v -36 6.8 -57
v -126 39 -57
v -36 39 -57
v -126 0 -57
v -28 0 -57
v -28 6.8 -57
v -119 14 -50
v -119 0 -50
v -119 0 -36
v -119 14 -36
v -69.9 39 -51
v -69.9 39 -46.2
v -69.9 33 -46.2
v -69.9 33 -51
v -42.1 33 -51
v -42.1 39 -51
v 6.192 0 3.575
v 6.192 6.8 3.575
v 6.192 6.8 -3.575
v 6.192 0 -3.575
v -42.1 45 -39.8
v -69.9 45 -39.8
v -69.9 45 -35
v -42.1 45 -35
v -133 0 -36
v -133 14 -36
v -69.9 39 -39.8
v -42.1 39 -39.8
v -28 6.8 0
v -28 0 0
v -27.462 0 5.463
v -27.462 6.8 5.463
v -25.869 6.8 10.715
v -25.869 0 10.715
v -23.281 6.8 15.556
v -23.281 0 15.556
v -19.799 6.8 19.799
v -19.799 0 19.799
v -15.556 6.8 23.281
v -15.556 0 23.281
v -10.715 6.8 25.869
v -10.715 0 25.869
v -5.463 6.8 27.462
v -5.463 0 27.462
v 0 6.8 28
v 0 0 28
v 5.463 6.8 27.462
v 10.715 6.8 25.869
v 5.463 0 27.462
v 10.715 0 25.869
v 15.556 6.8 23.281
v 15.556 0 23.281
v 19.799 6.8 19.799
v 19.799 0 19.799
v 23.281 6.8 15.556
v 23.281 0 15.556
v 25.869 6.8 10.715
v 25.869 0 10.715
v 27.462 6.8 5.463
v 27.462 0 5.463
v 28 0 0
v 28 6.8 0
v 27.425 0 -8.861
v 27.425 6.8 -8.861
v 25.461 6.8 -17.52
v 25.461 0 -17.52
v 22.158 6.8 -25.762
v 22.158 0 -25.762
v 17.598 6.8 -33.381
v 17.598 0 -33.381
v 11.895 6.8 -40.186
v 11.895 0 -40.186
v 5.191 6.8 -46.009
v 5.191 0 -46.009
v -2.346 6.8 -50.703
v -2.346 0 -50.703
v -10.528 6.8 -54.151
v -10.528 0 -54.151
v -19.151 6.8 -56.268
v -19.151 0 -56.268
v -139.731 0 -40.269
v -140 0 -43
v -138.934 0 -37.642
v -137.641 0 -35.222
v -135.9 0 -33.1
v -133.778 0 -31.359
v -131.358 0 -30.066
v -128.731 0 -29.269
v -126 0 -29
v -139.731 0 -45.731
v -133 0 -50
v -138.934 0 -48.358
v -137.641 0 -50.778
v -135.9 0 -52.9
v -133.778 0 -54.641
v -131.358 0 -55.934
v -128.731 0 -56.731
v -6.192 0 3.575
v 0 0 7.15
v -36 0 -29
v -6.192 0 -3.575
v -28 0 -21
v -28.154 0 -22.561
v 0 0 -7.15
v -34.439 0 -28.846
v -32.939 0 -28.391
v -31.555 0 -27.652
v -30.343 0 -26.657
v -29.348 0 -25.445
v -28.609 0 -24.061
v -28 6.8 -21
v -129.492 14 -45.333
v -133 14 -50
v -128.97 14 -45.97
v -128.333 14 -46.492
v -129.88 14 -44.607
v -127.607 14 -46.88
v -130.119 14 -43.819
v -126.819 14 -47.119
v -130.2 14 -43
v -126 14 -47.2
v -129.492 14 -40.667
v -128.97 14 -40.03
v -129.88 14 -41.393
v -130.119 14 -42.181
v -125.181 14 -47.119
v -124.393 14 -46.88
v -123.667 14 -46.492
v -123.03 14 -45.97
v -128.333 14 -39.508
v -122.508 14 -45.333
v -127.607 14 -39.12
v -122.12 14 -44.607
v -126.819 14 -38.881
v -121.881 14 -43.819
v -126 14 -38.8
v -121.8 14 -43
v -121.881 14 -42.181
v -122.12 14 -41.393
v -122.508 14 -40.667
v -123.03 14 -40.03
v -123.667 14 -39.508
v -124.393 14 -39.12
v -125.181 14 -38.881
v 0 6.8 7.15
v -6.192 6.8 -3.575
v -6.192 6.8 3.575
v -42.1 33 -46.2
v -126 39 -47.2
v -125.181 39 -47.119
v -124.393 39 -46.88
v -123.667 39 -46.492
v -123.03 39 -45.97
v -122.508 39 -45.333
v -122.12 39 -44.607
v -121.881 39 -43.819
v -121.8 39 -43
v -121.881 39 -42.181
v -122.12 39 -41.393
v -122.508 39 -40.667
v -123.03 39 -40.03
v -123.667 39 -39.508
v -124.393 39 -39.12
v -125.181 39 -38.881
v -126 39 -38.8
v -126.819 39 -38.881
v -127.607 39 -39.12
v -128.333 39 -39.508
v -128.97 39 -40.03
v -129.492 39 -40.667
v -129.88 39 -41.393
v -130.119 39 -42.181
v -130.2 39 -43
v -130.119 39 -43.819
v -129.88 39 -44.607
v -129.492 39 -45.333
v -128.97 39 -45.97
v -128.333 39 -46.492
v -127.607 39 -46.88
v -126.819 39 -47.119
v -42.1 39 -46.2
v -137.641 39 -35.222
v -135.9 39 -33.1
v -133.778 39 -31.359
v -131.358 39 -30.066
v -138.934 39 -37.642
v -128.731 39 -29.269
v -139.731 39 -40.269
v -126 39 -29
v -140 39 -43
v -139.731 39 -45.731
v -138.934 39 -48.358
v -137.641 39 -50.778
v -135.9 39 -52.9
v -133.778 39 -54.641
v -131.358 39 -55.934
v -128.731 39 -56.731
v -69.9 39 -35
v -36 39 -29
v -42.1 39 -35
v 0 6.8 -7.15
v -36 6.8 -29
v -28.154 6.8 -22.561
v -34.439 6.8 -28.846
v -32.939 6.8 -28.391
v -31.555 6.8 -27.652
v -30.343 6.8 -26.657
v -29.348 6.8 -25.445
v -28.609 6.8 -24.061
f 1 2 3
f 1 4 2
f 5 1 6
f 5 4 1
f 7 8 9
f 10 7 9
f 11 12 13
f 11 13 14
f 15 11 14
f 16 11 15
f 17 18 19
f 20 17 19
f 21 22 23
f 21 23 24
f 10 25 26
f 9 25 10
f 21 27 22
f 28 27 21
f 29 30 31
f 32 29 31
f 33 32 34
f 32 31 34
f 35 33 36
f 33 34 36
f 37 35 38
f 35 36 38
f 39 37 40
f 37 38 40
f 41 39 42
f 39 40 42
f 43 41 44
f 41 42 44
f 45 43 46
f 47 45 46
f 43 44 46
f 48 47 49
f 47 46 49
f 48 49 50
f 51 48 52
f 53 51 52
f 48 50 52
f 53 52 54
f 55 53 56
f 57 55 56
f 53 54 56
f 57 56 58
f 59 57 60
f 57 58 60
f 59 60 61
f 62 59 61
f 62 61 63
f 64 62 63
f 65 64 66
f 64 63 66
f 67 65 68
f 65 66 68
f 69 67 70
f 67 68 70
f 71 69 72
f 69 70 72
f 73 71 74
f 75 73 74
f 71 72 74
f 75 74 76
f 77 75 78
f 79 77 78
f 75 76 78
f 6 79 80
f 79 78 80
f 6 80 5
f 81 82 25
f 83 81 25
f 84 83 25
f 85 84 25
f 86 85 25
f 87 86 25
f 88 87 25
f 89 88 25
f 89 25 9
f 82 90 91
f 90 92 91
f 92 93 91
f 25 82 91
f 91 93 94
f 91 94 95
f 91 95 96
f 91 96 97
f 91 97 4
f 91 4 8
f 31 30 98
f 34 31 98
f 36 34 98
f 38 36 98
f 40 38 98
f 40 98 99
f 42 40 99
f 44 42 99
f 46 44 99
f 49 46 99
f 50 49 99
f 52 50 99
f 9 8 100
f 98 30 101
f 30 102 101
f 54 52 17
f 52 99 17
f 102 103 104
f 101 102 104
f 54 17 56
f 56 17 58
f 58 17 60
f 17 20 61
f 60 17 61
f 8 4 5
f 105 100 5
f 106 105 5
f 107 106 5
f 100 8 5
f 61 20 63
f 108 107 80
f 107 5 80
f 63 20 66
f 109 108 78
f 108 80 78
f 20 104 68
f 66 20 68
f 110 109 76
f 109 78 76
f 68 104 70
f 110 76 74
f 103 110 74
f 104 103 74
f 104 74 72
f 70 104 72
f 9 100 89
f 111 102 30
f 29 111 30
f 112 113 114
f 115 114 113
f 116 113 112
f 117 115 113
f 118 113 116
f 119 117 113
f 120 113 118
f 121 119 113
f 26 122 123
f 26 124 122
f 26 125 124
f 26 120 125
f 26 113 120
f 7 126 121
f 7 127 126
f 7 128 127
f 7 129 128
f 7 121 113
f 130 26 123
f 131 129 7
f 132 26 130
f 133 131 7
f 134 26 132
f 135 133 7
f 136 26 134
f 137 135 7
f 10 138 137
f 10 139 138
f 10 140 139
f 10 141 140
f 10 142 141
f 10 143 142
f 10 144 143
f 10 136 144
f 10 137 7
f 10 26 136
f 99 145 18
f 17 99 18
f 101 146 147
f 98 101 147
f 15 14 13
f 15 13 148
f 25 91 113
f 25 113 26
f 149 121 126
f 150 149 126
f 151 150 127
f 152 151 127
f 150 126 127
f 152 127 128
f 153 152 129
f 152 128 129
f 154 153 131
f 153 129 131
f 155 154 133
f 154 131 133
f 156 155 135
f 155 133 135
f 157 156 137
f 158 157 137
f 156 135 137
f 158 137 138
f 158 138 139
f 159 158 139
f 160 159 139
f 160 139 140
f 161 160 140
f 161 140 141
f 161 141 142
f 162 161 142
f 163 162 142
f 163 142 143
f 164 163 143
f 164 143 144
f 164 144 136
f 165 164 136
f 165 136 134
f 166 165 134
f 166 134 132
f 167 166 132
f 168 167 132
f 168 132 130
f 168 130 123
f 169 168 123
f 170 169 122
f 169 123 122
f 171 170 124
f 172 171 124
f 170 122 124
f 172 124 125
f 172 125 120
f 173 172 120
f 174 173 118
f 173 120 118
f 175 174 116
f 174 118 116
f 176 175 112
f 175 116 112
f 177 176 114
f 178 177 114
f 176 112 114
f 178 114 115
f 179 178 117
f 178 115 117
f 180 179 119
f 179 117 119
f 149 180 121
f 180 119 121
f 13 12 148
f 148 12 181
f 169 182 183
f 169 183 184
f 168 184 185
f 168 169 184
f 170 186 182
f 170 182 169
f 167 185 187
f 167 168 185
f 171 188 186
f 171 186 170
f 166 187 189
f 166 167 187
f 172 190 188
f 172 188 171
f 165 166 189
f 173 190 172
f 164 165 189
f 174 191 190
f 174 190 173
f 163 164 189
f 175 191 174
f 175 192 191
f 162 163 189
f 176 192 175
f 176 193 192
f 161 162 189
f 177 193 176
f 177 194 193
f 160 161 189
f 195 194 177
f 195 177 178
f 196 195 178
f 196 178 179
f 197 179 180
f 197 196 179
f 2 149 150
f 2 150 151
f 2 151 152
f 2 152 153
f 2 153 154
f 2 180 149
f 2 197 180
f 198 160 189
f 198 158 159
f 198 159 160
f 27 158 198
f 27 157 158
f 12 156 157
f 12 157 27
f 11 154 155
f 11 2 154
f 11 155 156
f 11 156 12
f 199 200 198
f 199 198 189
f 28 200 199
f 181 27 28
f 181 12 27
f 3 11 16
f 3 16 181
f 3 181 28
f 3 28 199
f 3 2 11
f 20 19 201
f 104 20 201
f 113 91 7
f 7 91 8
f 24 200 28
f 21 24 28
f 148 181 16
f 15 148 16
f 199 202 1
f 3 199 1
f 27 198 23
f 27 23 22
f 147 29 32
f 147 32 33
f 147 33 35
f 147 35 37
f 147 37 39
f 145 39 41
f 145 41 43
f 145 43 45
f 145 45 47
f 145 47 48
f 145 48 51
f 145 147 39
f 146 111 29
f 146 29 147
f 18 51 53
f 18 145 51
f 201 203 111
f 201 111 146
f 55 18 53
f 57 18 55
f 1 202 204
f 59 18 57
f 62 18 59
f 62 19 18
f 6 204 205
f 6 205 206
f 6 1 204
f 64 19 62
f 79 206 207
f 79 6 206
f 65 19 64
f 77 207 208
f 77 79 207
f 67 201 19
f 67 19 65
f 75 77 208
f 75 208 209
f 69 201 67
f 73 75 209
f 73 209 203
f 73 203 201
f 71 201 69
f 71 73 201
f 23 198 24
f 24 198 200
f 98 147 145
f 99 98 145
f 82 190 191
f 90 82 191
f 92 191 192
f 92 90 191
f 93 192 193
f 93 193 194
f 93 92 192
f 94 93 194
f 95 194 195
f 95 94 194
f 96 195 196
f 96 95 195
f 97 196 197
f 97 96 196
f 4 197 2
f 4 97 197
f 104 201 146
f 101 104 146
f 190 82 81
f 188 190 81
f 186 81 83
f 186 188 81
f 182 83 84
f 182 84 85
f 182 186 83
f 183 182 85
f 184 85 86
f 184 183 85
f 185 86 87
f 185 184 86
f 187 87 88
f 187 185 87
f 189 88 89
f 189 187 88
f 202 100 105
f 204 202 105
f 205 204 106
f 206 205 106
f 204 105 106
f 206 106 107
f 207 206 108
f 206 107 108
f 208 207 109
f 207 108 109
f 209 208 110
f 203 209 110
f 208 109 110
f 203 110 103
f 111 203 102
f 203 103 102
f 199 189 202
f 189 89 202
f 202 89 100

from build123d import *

# Parameters (mm, degrees)
EXTRUDE_1_DEPTH     = 6.8
CUT_EXTRUDE_1_DEPTH = 6.9
SKETCH_3_W          = 104
SKETCH_3_H          = 28
EXTRUDE_2_DEPTH     = 32.2
SKETCH_4_W          = 27.8
SKETCH_4_H          = 4.8
CUT_EXTRUDE_2_DEPTH = 6
SKETCH_4_3_W        = 27.8
SKETCH_4_3_H        = 4.8
EXTRUDE_3_DEPTH     = 6
SKETCH_5_W          = 14
SKETCH_5_H          = 14
CUT_EXTRUDE_3_DEPTH = 14
SKETCH_6_R          = 4.2
CUT_EXTRUDE_4_DEPTH = 155.304892988
FILLET_1_R          = 14


with BuildPart() as part:
    # Эскиз1 → Бобышка-Вытянуть1 (new body)
    with BuildSketch(Plane(origin=(0, 0, 0), x_dir=(1, 0, 0), z_dir=(0, 1, 0))):
        with BuildLine():
            ThreePointArc((-28, 0), (0, -28), (28, 0))
            ThreePointArc((28, 0), (11.895099372, 40.186413418), (-28, 57))
            Line((-28, 57), (-140, 57))
            Line((-140, 57), (-140, 29))
            Line((-140, 29), (-36, 29))
            ThreePointArc((-36, 29), (-30.343145751, 26.656854249), (-28, 21))
            Line((-28, 21), (-28, 0))
        make_face()
    extrude(amount=EXTRUDE_1_DEPTH)

    # Эскиз2 → Вырез-Вытянуть1 (cut)
    with BuildSketch(Plane(origin=(0, 6.8, 0), x_dir=(1, 0, 0), z_dir=(0, 1, 0))):
        Polygon((0, 7.15), (-6.192081637, 3.575), (-6.192081637, -3.575), (0, -7.15), (6.192081637, -3.575), (6.192081637, 3.575), align=None)
    extrude(amount=-CUT_EXTRUDE_1_DEPTH, mode=Mode.SUBTRACT)

    # Эскиз3 → Бобышка-Вытянуть2 (add)
    with BuildSketch(Plane(origin=(0, 6.8, 0), x_dir=(1, 0, 0), z_dir=(0, 1, 0))):
        with Locations((-88, 43)):
            Rectangle(SKETCH_3_W, SKETCH_3_H)
    extrude(amount=EXTRUDE_2_DEPTH)

    # Эскиз4 → Вырез-Вытянуть2 (cut)
    with BuildSketch(Plane(origin=(0, 39, 0), x_dir=(1, 0, 0), z_dir=(0, 1, 0))):
        with Locations((-56, 48.6)):
            Rectangle(SKETCH_4_W, SKETCH_4_H)
    extrude(amount=-CUT_EXTRUDE_2_DEPTH, mode=Mode.SUBTRACT)

    # Эскиз4<3> → Бобышка-Вытянуть3 (add)
    with BuildSketch(Plane(origin=(0, 39, 0), x_dir=(1, 0, 0), z_dir=(0, 1, 0))):
        with Locations((-56, 37.4)):
            Rectangle(SKETCH_4_3_W, SKETCH_4_3_H)
    extrude(amount=EXTRUDE_3_DEPTH)

    # Эскиз5 → Вырез-Вытянуть3 (cut)
    with BuildSketch(Plane.XZ):
        with Locations((-126, -43)):
            Rectangle(SKETCH_5_W, SKETCH_5_H)
    extrude(amount=-CUT_EXTRUDE_3_DEPTH, mode=Mode.SUBTRACT)

    # Эскиз6 → Вырез-Вытянуть4 (cut, through all)
    with BuildSketch(Plane.XZ.offset(-14)):
        with Locations(Location((-126, -43, 0), (0, 0, 270))):
            Circle(SKETCH_6_R)
    extrude(amount=-CUT_EXTRUDE_4_DEPTH, mode=Mode.SUBTRACT)

    # Скругление1
    fillet_1_edges = [part.edges().sort_by_distance(p)[0] for p in [
        (-140, 19.5, -29),
        (-140, 19.5, -57),
    ]]
    fillet(fillet_1_edges, radius=FILLET_1_R - 0.0001)  # a hair under: the kernel refuses the full size


solid = part.part
